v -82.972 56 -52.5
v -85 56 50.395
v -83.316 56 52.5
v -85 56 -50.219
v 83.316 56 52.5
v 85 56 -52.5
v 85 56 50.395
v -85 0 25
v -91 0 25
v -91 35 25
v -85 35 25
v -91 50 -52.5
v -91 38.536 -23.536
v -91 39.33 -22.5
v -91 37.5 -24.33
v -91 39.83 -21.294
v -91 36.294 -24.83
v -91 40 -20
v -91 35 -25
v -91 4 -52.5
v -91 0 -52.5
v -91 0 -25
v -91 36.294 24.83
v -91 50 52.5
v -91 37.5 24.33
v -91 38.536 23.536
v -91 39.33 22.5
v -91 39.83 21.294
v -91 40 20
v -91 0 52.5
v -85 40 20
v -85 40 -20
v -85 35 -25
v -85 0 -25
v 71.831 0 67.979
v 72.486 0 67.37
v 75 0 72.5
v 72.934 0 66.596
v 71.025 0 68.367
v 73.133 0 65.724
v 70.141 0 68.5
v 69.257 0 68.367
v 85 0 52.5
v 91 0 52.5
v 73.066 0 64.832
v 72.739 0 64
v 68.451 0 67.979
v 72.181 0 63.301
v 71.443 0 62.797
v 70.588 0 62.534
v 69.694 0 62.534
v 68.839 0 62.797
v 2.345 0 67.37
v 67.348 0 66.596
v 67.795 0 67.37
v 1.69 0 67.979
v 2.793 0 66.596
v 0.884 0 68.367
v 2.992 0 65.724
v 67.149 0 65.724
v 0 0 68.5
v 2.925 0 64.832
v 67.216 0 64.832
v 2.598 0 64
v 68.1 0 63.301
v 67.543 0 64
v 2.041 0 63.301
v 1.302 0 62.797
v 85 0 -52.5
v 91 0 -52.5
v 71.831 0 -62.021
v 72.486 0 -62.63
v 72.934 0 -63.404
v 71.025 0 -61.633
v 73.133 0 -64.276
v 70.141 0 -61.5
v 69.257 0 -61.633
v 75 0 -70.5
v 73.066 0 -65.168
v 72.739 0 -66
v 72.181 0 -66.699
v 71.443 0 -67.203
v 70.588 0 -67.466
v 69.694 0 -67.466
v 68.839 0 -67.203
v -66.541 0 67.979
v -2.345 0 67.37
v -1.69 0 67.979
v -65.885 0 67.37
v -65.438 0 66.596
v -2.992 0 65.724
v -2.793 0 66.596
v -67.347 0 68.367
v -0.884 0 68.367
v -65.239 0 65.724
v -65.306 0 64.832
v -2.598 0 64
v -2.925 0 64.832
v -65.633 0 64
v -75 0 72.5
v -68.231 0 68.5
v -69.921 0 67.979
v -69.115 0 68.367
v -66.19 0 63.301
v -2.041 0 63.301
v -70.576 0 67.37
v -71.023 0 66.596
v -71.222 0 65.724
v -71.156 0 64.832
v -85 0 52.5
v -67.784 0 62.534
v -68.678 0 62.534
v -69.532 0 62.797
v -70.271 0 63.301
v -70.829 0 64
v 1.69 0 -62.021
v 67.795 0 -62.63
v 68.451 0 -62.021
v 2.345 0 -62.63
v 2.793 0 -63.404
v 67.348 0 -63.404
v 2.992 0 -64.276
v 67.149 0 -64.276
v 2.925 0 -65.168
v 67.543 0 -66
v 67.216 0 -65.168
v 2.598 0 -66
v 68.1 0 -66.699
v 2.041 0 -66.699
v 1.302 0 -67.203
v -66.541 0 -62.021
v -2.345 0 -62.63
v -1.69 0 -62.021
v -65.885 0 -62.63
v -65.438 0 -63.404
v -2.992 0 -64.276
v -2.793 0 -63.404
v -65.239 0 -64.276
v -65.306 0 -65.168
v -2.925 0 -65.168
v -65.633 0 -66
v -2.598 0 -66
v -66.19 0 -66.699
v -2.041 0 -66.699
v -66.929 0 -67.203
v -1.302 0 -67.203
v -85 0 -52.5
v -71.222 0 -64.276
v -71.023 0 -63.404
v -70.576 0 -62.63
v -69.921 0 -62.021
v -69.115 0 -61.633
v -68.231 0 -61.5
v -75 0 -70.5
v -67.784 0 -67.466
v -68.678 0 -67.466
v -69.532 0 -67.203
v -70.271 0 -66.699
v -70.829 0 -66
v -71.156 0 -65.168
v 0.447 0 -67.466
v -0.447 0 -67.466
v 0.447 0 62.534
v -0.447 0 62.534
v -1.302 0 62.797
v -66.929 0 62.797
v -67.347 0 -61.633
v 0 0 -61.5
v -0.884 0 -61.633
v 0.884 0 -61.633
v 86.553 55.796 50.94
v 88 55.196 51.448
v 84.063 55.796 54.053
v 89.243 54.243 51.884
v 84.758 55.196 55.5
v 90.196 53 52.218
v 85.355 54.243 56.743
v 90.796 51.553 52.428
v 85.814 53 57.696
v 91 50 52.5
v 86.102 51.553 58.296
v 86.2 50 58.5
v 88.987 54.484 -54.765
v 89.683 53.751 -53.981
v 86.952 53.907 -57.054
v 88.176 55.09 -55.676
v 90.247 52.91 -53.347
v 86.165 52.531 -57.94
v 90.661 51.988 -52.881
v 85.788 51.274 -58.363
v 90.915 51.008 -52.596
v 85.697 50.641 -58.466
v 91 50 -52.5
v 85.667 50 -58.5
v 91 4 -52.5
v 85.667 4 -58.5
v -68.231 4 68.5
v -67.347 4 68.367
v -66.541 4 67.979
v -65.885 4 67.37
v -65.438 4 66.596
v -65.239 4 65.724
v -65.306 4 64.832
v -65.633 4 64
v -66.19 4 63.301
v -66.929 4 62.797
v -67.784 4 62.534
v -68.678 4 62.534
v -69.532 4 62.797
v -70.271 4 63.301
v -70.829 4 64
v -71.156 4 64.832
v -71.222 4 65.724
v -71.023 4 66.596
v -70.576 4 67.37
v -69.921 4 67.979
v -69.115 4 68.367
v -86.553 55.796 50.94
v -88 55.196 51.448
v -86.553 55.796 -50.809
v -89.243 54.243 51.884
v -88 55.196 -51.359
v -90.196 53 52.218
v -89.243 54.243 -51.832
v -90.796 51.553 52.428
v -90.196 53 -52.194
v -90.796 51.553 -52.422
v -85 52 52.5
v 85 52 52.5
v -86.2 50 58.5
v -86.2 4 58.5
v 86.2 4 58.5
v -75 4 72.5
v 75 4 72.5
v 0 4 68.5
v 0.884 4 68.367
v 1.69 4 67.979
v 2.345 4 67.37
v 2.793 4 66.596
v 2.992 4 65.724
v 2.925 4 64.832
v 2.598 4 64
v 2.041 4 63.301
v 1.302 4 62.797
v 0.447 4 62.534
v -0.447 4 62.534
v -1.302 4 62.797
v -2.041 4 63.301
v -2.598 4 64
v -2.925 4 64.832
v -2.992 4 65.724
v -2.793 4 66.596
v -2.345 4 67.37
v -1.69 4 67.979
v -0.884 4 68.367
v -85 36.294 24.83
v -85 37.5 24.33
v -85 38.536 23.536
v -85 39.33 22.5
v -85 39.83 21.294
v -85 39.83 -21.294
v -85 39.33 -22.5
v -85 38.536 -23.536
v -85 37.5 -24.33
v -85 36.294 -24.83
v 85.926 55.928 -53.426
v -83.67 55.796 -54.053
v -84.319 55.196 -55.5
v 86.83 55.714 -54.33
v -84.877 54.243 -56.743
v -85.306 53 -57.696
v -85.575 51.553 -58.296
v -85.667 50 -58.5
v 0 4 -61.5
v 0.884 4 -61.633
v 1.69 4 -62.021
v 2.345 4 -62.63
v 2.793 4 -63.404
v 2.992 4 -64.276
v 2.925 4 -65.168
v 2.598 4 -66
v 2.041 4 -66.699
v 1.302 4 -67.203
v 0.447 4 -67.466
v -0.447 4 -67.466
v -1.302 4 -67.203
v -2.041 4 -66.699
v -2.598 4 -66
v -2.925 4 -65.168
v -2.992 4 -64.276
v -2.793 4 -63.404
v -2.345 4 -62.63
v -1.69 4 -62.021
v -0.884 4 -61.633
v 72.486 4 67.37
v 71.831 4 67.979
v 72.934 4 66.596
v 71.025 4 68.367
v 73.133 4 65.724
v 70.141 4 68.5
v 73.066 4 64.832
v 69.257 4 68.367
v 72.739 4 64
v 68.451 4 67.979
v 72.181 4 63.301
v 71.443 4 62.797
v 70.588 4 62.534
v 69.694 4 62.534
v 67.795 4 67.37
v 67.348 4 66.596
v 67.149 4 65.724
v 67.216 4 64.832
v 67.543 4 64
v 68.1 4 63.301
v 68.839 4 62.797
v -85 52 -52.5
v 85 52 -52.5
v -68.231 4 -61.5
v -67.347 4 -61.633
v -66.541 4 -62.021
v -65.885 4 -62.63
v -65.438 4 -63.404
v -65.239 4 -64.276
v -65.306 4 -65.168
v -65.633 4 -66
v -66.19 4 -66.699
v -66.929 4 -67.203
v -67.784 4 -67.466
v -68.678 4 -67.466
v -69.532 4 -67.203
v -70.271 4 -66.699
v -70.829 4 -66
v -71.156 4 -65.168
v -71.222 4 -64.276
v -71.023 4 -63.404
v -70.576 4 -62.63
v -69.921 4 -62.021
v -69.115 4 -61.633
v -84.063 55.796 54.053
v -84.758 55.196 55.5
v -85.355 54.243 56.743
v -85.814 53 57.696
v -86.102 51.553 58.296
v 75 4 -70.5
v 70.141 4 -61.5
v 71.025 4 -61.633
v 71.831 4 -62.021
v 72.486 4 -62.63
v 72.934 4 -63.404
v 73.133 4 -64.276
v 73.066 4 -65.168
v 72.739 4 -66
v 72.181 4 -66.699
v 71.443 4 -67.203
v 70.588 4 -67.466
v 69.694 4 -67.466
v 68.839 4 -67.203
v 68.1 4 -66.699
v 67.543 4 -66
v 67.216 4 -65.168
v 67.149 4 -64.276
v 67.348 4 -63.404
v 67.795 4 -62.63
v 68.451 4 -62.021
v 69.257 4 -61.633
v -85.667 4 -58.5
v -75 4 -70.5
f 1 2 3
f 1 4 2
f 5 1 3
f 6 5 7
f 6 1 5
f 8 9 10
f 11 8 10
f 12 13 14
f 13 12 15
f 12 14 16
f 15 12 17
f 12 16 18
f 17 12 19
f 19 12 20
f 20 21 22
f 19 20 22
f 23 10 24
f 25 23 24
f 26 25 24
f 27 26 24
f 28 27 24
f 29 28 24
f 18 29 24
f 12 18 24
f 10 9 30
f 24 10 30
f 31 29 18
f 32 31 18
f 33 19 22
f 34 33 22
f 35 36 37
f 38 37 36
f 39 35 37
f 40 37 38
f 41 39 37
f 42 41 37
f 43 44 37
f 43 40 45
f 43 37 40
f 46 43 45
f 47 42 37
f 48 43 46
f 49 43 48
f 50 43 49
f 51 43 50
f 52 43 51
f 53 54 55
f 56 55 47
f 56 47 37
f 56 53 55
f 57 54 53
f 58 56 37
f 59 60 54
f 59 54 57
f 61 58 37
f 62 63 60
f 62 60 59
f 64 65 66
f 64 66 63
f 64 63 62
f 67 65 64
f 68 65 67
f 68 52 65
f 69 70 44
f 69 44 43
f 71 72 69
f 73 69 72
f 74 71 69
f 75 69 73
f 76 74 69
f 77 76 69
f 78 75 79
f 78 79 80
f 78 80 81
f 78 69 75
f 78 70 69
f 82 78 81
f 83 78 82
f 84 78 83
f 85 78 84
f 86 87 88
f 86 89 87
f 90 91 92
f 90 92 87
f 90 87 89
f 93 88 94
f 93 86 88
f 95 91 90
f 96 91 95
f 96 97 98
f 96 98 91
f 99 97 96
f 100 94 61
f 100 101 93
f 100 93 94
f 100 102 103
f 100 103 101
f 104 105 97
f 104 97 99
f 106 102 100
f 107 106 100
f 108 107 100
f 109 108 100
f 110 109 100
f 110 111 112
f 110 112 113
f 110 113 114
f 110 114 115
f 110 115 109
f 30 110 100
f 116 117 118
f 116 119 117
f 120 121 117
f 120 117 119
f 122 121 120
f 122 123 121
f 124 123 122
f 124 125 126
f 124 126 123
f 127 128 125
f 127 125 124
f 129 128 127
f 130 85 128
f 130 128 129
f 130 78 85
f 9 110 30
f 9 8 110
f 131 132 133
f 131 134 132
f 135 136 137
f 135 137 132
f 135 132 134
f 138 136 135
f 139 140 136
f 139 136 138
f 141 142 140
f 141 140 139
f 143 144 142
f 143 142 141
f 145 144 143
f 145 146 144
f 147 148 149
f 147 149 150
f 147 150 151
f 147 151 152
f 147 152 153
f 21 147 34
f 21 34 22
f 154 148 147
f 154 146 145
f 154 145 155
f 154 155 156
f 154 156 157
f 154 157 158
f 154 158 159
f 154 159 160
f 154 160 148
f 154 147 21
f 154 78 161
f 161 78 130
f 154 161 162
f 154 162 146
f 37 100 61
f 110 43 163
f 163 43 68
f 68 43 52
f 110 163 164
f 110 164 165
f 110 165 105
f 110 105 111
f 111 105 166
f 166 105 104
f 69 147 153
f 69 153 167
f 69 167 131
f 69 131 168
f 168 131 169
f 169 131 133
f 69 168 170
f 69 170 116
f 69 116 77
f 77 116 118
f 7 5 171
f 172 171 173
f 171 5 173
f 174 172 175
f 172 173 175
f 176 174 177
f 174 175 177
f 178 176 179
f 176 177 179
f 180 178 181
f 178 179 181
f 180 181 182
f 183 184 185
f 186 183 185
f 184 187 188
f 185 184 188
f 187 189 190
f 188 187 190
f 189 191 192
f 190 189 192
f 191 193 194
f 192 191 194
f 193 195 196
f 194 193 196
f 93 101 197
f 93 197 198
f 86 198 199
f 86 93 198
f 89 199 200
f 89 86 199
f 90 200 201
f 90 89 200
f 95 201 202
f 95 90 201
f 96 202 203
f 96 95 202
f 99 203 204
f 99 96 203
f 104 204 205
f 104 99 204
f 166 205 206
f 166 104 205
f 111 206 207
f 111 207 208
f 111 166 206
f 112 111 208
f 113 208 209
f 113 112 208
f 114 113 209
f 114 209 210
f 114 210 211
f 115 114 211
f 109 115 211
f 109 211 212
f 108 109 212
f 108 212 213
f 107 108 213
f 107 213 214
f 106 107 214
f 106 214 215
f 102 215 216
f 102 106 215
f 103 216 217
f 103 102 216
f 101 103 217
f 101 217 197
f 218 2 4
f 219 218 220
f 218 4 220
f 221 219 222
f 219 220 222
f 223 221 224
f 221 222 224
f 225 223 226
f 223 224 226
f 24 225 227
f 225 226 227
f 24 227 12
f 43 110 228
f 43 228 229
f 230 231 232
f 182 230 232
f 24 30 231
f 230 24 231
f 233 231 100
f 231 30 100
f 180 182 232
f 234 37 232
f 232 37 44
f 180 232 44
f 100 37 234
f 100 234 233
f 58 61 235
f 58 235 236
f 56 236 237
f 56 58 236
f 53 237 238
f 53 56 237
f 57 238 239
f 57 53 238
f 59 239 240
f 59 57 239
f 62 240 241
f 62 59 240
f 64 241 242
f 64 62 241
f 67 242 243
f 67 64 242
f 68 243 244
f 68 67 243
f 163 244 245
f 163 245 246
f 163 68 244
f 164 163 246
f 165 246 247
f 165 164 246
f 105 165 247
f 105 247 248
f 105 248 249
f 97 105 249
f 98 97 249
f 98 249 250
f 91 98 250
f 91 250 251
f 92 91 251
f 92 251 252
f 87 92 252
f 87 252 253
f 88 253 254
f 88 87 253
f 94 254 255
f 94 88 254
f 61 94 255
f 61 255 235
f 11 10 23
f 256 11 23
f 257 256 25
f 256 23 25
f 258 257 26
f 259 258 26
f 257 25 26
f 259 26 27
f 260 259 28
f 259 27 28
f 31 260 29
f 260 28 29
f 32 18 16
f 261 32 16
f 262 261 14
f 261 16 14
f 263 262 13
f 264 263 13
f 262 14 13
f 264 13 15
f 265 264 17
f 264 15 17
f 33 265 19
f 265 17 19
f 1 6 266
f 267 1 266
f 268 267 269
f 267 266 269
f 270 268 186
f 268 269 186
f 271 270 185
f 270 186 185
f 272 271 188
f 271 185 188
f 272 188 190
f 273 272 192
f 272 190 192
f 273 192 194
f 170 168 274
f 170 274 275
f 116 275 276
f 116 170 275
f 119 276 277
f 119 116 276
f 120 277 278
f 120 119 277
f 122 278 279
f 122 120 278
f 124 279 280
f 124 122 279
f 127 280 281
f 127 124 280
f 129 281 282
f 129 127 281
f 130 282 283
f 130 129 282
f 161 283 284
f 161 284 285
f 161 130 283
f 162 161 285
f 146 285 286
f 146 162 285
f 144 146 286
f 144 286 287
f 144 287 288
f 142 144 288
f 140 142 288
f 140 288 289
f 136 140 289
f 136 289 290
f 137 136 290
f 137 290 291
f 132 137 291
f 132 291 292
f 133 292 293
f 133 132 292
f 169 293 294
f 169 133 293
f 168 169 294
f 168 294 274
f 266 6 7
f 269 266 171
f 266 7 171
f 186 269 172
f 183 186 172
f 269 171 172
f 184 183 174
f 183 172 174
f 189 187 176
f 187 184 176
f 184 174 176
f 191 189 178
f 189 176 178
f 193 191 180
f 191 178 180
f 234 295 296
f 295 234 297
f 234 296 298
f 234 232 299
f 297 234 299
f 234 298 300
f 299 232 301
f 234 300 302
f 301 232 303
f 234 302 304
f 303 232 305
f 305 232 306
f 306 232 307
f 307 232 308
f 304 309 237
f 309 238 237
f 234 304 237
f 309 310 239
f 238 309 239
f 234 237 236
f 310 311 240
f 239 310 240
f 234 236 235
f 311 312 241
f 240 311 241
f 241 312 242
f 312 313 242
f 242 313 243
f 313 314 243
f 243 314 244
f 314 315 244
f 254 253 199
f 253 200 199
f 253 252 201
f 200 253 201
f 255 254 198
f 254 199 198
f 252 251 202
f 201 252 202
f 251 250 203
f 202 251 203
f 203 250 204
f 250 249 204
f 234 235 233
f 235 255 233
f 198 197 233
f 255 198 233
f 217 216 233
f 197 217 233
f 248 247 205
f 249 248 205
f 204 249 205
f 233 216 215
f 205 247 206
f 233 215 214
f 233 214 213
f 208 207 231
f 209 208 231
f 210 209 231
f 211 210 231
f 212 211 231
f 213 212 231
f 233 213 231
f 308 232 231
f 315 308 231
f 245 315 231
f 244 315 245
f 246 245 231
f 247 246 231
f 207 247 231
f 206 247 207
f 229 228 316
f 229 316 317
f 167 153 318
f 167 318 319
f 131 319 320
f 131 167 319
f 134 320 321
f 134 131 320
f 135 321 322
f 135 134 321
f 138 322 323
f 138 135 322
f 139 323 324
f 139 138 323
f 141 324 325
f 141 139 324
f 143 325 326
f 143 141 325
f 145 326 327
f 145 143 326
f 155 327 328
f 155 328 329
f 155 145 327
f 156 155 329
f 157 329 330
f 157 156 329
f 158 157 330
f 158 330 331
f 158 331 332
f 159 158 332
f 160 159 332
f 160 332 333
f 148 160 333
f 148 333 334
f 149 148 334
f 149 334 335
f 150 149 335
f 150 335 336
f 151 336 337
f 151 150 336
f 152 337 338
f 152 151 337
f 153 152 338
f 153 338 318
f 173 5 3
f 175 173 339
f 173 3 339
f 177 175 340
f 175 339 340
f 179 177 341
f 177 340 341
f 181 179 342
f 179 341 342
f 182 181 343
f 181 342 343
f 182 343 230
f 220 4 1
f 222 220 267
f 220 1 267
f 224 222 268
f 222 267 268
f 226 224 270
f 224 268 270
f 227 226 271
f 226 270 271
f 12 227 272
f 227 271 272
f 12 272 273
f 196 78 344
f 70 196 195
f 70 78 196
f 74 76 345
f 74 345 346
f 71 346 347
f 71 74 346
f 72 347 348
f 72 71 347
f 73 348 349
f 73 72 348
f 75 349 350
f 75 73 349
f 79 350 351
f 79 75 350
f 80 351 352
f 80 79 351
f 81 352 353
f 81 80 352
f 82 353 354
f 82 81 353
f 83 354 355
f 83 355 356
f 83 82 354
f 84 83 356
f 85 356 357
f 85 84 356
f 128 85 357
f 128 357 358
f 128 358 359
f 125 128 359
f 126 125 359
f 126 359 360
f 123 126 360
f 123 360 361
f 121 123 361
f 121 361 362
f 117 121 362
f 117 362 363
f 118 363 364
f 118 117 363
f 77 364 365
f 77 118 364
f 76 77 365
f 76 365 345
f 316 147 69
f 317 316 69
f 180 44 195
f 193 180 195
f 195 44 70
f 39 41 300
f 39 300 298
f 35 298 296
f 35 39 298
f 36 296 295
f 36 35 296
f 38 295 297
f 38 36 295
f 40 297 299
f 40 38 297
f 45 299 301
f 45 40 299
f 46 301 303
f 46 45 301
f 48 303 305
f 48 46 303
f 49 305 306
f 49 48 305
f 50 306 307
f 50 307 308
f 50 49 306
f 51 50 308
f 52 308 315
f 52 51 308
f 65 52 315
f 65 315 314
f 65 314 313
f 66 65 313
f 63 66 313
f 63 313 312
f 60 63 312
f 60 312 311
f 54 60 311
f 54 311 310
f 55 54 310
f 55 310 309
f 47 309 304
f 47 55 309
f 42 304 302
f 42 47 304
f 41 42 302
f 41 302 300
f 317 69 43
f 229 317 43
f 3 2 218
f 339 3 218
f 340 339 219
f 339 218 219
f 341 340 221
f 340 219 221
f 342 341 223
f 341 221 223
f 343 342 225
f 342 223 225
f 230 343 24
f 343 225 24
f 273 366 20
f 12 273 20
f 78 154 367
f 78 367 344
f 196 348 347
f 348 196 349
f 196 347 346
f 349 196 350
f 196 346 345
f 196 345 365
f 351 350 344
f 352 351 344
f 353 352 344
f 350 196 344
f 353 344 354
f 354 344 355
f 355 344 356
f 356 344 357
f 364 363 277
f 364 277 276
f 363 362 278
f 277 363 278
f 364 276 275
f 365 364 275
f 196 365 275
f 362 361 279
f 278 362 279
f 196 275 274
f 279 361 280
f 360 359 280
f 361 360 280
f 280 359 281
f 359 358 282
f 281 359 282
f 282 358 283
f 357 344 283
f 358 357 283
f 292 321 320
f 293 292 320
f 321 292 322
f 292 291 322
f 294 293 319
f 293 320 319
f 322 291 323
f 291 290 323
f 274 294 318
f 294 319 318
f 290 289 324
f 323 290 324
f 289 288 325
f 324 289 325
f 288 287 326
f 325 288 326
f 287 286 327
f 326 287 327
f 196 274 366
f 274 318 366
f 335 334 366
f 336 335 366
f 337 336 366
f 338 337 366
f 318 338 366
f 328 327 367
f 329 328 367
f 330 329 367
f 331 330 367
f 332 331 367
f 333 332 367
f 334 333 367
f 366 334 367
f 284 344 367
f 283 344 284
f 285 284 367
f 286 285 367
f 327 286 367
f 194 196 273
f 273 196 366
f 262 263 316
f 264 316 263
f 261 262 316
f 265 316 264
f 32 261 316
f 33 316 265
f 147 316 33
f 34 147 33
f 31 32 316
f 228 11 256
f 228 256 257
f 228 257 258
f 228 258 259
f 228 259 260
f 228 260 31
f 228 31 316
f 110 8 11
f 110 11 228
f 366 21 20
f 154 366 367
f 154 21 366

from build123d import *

# Parameters (mm, degrees)
SKETCH_1_R          = 3
EXTRUDE_3_DEPTH     = 4
EXTRUDE_5_DEPTH     = 52
SKETCH_4_W          = 170
SKETCH_4_H          = 105
CUT_EXTRUDE_1_DEPTH = 52
FILLET_1_R          = 6
CUT_EXTRUDE_2_REACH = 205.755


with BuildPart() as part:
    # 草图1 → 凸台-拉伸3 (new body)
    with BuildSketch(Plane(origin=(0, 0, 0), x_dir=(1, 0, 0), z_dir=(0, 1, 0))):
        Polygon((-75, 70.5), (75, 70.5), (91, 52.5), (91, -52.5), (75, -72.5), (-75, -72.5), (-91, -52.5), (-91, 52.5), align=None)
        with Locations(Location((0, 64.5, 0), (0, 0, 270))):
            Circle(SKETCH_1_R, mode=Mode.SUBTRACT)
        with Locations(Location((-68.230807573, 64.5, 0), (0, 0, 270))):
            Circle(SKETCH_1_R, mode=Mode.SUBTRACT)
        with Locations(Location((70.140932989, 64.5, 0), (0, 0, 270))):
            Circle(SKETCH_1_R, mode=Mode.SUBTRACT)
        with Locations(Location((0, -65.5, 0), (0, 0, 270))):
            Circle(SKETCH_1_R, mode=Mode.SUBTRACT)
        with Locations(Location((70.140932989, -65.5, 0), (0, 0, 270))):
            Circle(SKETCH_1_R, mode=Mode.SUBTRACT)
        with Locations(Location((-68.230807573, -65.5, 0), (0, 0, 270))):
            Circle(SKETCH_1_R, mode=Mode.SUBTRACT)
    extrude(amount=EXTRUDE_3_DEPTH)

    # 草图3 → 凸台-拉伸5 (add)
    with BuildSketch(Plane(origin=(0, 4, 0), x_dir=(1, 0, 0), z_dir=(0, 1, 0))):
        Polygon((-91, 52.5), (-91, -52.5), (-86.2, -58.5), (86.2, -58.5), (91, -52.5), (91, 52.5), (85.666666667, 58.5), (-85.666666667, 58.5), align=None)
    extrude(amount=EXTRUDE_5_DEPTH)

    # 草图4 → 切除-拉伸1 (cut)
    with BuildSketch(Plane.XZ):
        Rectangle(SKETCH_4_W, SKETCH_4_H)
    extrude(amount=-CUT_EXTRUDE_1_DEPTH, mode=Mode.SUBTRACT)

    # 圆角1
    # the kernel refuses this fillet: 6 mm, written as the material it takes off along each edge
    with BuildSketch(Plane(origin=(-100.370425713, 56, 40.786967858), x_dir=(0.7808688094430221, 0, -0.6246950475544346), z_dir=(0.6246950475544346, 0, 0.7808688094430221)), Plane(origin=(76.829574287, 56, 70.213032142), x_dir=(-0.7808688094430356, 0, -0.6246950475544176), z_dir=(0.6246950475544177, 0, -0.7808688094430356))) as fillet_1_piece_1:
        with BuildLine():
            CenterArc((FILLET_1_R, -FILLET_1_R), FILLET_1_R, 90, 90)
            Line((0, -FILLET_1_R), (0, 0))
            Line((0, 0), (FILLET_1_R, 0))
        make_face()
    extrude(amount=37.683749085, mode=Mode.SUBTRACT)
    with BuildSketch(Plane(origin=(-75.701209084, 56, -69.71113978), x_dir=(0, -1, 0), z_dir=(-0.6643638388299179, 0, 0.7474093186836614))) as fillet_1_piece_2:
        with BuildLine():
            CenterArc((FILLET_1_R, FILLET_1_R), FILLET_1_R, 180, 90)
            Line((0, FILLET_1_R), (0, 0))
            Line((0, 0), (FILLET_1_R, 0))
        make_face()
    extrude(amount=38.027729719, mode=Mode.SUBTRACT)
    with BuildSketch(Plane(origin=(100.666666667, 56, -58.5), x_dir=(0, 0, 1), z_dir=(-1, 0, 0))) as fillet_1_piece_3:
        with BuildLine():
            CenterArc((FILLET_1_R, -FILLET_1_R), FILLET_1_R, 90, 90)
            Line((0, -FILLET_1_R), (0, 0))
            Line((0, 0), (FILLET_1_R, 0))
        make_face()
    extrude(amount=201.333333333, mode=Mode.SUBTRACT)
    with BuildSketch(Plane(origin=(91, 56, 67.5), x_dir=(-1, 0, 0), z_dir=(0, 0, -1))) as fillet_1_piece_4:
        with BuildLine():
            CenterArc((FILLET_1_R, -FILLET_1_R), FILLET_1_R, 90, 90)
            Line((0, -FILLET_1_R), (0, 0))
            Line((0, 0), (FILLET_1_R, 0))
        make_face()
    extrude(amount=135, mode=Mode.SUBTRACT)
    with BuildSketch(Plane(origin=(-91, 56, -67.5), x_dir=(0, -1, 0), z_dir=(0, 0, 1))) as fillet_1_piece_5:
        with BuildLine():
            CenterArc((FILLET_1_R, FILLET_1_R), FILLET_1_R, 180, 90)
            Line((0, FILLET_1_R), (0, 0))
            Line((0, 0), (FILLET_1_R, 0))
        make_face()
    extrude(amount=135, mode=Mode.SUBTRACT)
    with BuildSketch(Plane(origin=(-101.2, 56, 58.5), x_dir=(0, 0, -1), z_dir=(1, 0, 0))) as fillet_1_piece_6:
        with BuildLine():
            CenterArc((FILLET_1_R, -FILLET_1_R), FILLET_1_R, 90, 90)
            Line((0, -FILLET_1_R), (0, 0))
            Line((0, 0), (FILLET_1_R, 0))
        make_face()
    extrude(amount=202.4, mode=Mode.SUBTRACT)

    # 草图5 → 切除-拉伸2 (cut, up to next)
    with BuildSketch(Plane.ZY.offset(91), mode=Mode.PRIVATE) as cut_extrude_2_sk1:
        with BuildLine():
            Line((-25, 0), (25, 0))
            Line((25, 0), (25, 35))
            ThreePointArc((25, 35), (23.535533906, 38.535533906), (20, 40))
            Line((20, 40), (-20, 40))
            ThreePointArc((-20, 40), (-23.535533906, 38.535533906), (-25, 35))
            Line((-25, 35), (-25, 0))
        make_face()
    cut_extrude_2_tool1 = extrude(cut_extrude_2_sk1.sketch, amount=-CUT_EXTRUDE_2_REACH, mode=Mode.PRIVATE) & part.part
    add(cut_extrude_2_tool1.solids().sort_by_distance((-91, 19.898145, 0))[0], mode=Mode.SUBTRACT)


solid = part.part
